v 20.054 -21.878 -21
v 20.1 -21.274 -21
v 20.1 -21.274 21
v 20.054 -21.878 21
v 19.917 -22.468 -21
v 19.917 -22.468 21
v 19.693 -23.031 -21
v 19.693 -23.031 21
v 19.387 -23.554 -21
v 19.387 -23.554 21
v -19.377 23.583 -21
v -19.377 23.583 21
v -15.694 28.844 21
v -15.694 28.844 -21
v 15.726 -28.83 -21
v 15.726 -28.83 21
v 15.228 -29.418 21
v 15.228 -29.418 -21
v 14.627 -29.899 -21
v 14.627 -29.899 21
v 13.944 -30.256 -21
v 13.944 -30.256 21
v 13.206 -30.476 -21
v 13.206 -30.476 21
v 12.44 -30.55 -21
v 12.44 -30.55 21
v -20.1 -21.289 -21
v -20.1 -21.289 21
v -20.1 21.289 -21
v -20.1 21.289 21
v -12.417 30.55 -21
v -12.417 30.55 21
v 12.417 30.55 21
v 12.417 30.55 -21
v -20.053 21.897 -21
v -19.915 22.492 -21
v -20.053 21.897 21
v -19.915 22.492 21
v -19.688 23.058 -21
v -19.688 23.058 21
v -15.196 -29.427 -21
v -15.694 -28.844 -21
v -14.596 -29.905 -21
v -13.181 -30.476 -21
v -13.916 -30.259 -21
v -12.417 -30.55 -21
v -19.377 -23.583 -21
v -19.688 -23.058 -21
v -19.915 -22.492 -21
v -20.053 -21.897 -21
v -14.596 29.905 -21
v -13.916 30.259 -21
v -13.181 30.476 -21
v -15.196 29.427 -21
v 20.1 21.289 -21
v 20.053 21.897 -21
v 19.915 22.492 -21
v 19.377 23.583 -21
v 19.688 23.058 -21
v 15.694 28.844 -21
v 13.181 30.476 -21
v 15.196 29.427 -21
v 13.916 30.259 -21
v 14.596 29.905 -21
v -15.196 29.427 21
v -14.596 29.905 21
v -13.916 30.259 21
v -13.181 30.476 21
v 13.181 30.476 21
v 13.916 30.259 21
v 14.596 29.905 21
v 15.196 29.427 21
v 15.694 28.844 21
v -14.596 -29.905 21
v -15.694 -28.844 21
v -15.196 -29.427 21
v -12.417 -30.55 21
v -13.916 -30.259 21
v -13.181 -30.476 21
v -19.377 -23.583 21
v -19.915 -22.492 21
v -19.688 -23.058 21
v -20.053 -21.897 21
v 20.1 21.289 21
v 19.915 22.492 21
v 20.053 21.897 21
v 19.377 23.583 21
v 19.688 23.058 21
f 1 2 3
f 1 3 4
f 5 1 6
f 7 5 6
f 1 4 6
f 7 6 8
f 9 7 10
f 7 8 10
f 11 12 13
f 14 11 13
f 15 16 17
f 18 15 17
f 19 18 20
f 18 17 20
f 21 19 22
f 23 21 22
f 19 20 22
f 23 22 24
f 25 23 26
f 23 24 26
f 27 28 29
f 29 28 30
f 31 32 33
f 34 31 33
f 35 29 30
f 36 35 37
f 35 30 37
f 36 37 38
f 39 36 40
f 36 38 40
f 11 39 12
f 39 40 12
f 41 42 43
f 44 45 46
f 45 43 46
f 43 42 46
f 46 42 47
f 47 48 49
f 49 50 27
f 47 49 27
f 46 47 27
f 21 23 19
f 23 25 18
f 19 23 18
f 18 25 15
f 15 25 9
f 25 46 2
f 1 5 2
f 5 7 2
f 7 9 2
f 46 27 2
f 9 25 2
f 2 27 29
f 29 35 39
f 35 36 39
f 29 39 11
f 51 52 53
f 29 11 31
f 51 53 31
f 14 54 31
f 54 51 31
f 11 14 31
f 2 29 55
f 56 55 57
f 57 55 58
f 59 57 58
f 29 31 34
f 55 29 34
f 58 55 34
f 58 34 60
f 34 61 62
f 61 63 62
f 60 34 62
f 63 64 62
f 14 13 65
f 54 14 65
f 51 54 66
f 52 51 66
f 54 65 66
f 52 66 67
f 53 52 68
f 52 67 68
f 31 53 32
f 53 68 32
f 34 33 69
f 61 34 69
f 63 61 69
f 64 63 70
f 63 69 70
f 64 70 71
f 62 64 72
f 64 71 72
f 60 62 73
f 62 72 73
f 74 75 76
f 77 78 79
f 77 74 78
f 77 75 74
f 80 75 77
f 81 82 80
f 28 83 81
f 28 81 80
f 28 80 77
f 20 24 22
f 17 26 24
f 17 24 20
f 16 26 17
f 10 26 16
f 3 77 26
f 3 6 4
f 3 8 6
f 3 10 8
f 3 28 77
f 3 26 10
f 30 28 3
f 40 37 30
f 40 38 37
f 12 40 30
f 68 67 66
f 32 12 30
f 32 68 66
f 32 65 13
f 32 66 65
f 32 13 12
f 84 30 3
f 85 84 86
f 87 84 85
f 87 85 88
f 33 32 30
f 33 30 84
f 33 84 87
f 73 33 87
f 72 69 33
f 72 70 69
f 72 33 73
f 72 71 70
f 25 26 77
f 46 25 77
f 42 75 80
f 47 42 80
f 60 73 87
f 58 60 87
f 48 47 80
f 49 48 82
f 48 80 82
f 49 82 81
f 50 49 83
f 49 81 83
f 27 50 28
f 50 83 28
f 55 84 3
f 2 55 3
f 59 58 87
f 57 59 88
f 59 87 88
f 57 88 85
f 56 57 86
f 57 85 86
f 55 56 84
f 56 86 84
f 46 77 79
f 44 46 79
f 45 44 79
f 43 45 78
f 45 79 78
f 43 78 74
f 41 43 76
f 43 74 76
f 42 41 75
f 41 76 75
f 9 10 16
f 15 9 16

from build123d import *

# Parameters (mm, degrees)
SKETCH1_W               = 40.2
SKETCH1_H               = 61.1
BOSS_EXTRUDE1_DEPTH     = 21
CUT_EXTRUDE_THIN1_DEPTH = 42


with BuildPart() as part:
    # Sketch1 → Boss-Extrude1 (new, symmetric)
    with BuildSketch(Plane.XY):
        Rectangle(SKETCH1_W, SKETCH1_H)
    extrude(amount=BOSS_EXTRUDE1_DEPTH, both=True)

    # Sketch2 → Cut-Extrude-Thin1 (cut)
    with BuildSketch(Plane.XY.offset(21)):
        with BuildLine():
            Line((12.43954262, -40.55), (-12.417377754, -40.55))
            ThreePointArc((-12.417377754, -40.55), (-18.882723085, -38.967701468), (-23.886624641, -34.578472821))
            Line((-23.886624641, -34.578472821), (-27.569246887, -29.317583898))
            ThreePointArc((-27.569246887, -29.317583898), (-29.452330441, -25.498062465), (-30.1, -21.289111077))
            Line((-30.1, -21.289111077), (-30.1, 0))
            Line((-30.1, 0), (-30.1, 21.289111077))
            ThreePointArc((-30.1, 21.289111077), (-29.452330441, 25.498062465), (-27.569246887, 29.317583898))
            Line((-27.569246887, 29.317583898), (-23.886624641, 34.578472821))
            ThreePointArc((-23.886624641, 34.578472821), (-18.882723085, 38.967701468), (-12.417377754, 40.55))
            Line((-12.417377754, 40.55), (12.417377754, 40.55))
            ThreePointArc((12.417377754, 40.55), (18.882723085, 38.967701468), (23.886624641, 34.578472821))
            Line((23.886624641, 34.578472821), (27.569246887, 29.317583898))
            ThreePointArc((27.569246887, 29.317583898), (29.452330441, 25.498062465), (30.1, 21.289111077))
            Line((30.1, 21.289111077), (30.1, 0))
            Line((30.1, 0), (30.1, -21.273665037))
            ThreePointArc((30.1, -21.273665037), (29.461154338, -25.454520783), (27.602920748, -29.253816306))
            Line((27.602920748, -29.253816306), (23.942463367, -34.530151269))
            ThreePointArc((23.942463367, -34.530151269), (18.930994007, -38.954074286), (12.43954262, -40.55))
        make_face()
        with BuildLine():
            Line((12.43954262, -30.55), (-12.417377754, -30.55))
            ThreePointArc((-12.417377754, -30.55), (-14.264619277, -30.097914705), (-15.694305436, -28.843849377))
            Line((-15.694305436, -28.843849377), (-19.376927682, -23.582960454))
            ThreePointArc((-19.376927682, -23.582960454), (-19.914951555, -22.491668616), (-20.1, -21.289111077))
            Line((-20.1, -21.289111077), (-20.1, 0))
            Line((-20.1, 0), (-20.1, 21.289111077))
            ThreePointArc((-20.1, 21.289111077), (-19.914951555, 22.491668616), (-19.376927682, 23.582960454))
            Line((-19.376927682, 23.582960454), (-15.694305436, 28.843849377))
            ThreePointArc((-15.694305436, 28.843849377), (-14.264619277, 30.097914705), (-12.417377754, 30.55))
            Line((-12.417377754, 30.55), (12.417377754, 30.55))
            ThreePointArc((12.417377754, 30.55), (14.264619277, 30.097914705), (15.694305436, 28.843849377))
            Line((15.694305436, 28.843849377), (19.376927682, 23.582960454))
            ThreePointArc((19.376927682, 23.582960454), (19.914951555, 22.491668616), (20.1, 21.289111077))
            Line((20.1, 21.289111077), (20.1, 0))
            Line((20.1, 0), (20.1, -21.273665037))
            ThreePointArc((20.1, -21.273665037), (19.917472668, -22.46819525), (19.386548785, -23.553708257))
            Line((19.386548785, -23.553708257), (15.726091405, -28.83004322))
            ThreePointArc((15.726091405, -28.83004322), (14.294243016, -30.094021224), (12.43954262, -30.55))
        make_face(mode=Mode.SUBTRACT)
    extrude(amount=-CUT_EXTRUDE_THIN1_DEPTH, mode=Mode.SUBTRACT)


solid = part.part
